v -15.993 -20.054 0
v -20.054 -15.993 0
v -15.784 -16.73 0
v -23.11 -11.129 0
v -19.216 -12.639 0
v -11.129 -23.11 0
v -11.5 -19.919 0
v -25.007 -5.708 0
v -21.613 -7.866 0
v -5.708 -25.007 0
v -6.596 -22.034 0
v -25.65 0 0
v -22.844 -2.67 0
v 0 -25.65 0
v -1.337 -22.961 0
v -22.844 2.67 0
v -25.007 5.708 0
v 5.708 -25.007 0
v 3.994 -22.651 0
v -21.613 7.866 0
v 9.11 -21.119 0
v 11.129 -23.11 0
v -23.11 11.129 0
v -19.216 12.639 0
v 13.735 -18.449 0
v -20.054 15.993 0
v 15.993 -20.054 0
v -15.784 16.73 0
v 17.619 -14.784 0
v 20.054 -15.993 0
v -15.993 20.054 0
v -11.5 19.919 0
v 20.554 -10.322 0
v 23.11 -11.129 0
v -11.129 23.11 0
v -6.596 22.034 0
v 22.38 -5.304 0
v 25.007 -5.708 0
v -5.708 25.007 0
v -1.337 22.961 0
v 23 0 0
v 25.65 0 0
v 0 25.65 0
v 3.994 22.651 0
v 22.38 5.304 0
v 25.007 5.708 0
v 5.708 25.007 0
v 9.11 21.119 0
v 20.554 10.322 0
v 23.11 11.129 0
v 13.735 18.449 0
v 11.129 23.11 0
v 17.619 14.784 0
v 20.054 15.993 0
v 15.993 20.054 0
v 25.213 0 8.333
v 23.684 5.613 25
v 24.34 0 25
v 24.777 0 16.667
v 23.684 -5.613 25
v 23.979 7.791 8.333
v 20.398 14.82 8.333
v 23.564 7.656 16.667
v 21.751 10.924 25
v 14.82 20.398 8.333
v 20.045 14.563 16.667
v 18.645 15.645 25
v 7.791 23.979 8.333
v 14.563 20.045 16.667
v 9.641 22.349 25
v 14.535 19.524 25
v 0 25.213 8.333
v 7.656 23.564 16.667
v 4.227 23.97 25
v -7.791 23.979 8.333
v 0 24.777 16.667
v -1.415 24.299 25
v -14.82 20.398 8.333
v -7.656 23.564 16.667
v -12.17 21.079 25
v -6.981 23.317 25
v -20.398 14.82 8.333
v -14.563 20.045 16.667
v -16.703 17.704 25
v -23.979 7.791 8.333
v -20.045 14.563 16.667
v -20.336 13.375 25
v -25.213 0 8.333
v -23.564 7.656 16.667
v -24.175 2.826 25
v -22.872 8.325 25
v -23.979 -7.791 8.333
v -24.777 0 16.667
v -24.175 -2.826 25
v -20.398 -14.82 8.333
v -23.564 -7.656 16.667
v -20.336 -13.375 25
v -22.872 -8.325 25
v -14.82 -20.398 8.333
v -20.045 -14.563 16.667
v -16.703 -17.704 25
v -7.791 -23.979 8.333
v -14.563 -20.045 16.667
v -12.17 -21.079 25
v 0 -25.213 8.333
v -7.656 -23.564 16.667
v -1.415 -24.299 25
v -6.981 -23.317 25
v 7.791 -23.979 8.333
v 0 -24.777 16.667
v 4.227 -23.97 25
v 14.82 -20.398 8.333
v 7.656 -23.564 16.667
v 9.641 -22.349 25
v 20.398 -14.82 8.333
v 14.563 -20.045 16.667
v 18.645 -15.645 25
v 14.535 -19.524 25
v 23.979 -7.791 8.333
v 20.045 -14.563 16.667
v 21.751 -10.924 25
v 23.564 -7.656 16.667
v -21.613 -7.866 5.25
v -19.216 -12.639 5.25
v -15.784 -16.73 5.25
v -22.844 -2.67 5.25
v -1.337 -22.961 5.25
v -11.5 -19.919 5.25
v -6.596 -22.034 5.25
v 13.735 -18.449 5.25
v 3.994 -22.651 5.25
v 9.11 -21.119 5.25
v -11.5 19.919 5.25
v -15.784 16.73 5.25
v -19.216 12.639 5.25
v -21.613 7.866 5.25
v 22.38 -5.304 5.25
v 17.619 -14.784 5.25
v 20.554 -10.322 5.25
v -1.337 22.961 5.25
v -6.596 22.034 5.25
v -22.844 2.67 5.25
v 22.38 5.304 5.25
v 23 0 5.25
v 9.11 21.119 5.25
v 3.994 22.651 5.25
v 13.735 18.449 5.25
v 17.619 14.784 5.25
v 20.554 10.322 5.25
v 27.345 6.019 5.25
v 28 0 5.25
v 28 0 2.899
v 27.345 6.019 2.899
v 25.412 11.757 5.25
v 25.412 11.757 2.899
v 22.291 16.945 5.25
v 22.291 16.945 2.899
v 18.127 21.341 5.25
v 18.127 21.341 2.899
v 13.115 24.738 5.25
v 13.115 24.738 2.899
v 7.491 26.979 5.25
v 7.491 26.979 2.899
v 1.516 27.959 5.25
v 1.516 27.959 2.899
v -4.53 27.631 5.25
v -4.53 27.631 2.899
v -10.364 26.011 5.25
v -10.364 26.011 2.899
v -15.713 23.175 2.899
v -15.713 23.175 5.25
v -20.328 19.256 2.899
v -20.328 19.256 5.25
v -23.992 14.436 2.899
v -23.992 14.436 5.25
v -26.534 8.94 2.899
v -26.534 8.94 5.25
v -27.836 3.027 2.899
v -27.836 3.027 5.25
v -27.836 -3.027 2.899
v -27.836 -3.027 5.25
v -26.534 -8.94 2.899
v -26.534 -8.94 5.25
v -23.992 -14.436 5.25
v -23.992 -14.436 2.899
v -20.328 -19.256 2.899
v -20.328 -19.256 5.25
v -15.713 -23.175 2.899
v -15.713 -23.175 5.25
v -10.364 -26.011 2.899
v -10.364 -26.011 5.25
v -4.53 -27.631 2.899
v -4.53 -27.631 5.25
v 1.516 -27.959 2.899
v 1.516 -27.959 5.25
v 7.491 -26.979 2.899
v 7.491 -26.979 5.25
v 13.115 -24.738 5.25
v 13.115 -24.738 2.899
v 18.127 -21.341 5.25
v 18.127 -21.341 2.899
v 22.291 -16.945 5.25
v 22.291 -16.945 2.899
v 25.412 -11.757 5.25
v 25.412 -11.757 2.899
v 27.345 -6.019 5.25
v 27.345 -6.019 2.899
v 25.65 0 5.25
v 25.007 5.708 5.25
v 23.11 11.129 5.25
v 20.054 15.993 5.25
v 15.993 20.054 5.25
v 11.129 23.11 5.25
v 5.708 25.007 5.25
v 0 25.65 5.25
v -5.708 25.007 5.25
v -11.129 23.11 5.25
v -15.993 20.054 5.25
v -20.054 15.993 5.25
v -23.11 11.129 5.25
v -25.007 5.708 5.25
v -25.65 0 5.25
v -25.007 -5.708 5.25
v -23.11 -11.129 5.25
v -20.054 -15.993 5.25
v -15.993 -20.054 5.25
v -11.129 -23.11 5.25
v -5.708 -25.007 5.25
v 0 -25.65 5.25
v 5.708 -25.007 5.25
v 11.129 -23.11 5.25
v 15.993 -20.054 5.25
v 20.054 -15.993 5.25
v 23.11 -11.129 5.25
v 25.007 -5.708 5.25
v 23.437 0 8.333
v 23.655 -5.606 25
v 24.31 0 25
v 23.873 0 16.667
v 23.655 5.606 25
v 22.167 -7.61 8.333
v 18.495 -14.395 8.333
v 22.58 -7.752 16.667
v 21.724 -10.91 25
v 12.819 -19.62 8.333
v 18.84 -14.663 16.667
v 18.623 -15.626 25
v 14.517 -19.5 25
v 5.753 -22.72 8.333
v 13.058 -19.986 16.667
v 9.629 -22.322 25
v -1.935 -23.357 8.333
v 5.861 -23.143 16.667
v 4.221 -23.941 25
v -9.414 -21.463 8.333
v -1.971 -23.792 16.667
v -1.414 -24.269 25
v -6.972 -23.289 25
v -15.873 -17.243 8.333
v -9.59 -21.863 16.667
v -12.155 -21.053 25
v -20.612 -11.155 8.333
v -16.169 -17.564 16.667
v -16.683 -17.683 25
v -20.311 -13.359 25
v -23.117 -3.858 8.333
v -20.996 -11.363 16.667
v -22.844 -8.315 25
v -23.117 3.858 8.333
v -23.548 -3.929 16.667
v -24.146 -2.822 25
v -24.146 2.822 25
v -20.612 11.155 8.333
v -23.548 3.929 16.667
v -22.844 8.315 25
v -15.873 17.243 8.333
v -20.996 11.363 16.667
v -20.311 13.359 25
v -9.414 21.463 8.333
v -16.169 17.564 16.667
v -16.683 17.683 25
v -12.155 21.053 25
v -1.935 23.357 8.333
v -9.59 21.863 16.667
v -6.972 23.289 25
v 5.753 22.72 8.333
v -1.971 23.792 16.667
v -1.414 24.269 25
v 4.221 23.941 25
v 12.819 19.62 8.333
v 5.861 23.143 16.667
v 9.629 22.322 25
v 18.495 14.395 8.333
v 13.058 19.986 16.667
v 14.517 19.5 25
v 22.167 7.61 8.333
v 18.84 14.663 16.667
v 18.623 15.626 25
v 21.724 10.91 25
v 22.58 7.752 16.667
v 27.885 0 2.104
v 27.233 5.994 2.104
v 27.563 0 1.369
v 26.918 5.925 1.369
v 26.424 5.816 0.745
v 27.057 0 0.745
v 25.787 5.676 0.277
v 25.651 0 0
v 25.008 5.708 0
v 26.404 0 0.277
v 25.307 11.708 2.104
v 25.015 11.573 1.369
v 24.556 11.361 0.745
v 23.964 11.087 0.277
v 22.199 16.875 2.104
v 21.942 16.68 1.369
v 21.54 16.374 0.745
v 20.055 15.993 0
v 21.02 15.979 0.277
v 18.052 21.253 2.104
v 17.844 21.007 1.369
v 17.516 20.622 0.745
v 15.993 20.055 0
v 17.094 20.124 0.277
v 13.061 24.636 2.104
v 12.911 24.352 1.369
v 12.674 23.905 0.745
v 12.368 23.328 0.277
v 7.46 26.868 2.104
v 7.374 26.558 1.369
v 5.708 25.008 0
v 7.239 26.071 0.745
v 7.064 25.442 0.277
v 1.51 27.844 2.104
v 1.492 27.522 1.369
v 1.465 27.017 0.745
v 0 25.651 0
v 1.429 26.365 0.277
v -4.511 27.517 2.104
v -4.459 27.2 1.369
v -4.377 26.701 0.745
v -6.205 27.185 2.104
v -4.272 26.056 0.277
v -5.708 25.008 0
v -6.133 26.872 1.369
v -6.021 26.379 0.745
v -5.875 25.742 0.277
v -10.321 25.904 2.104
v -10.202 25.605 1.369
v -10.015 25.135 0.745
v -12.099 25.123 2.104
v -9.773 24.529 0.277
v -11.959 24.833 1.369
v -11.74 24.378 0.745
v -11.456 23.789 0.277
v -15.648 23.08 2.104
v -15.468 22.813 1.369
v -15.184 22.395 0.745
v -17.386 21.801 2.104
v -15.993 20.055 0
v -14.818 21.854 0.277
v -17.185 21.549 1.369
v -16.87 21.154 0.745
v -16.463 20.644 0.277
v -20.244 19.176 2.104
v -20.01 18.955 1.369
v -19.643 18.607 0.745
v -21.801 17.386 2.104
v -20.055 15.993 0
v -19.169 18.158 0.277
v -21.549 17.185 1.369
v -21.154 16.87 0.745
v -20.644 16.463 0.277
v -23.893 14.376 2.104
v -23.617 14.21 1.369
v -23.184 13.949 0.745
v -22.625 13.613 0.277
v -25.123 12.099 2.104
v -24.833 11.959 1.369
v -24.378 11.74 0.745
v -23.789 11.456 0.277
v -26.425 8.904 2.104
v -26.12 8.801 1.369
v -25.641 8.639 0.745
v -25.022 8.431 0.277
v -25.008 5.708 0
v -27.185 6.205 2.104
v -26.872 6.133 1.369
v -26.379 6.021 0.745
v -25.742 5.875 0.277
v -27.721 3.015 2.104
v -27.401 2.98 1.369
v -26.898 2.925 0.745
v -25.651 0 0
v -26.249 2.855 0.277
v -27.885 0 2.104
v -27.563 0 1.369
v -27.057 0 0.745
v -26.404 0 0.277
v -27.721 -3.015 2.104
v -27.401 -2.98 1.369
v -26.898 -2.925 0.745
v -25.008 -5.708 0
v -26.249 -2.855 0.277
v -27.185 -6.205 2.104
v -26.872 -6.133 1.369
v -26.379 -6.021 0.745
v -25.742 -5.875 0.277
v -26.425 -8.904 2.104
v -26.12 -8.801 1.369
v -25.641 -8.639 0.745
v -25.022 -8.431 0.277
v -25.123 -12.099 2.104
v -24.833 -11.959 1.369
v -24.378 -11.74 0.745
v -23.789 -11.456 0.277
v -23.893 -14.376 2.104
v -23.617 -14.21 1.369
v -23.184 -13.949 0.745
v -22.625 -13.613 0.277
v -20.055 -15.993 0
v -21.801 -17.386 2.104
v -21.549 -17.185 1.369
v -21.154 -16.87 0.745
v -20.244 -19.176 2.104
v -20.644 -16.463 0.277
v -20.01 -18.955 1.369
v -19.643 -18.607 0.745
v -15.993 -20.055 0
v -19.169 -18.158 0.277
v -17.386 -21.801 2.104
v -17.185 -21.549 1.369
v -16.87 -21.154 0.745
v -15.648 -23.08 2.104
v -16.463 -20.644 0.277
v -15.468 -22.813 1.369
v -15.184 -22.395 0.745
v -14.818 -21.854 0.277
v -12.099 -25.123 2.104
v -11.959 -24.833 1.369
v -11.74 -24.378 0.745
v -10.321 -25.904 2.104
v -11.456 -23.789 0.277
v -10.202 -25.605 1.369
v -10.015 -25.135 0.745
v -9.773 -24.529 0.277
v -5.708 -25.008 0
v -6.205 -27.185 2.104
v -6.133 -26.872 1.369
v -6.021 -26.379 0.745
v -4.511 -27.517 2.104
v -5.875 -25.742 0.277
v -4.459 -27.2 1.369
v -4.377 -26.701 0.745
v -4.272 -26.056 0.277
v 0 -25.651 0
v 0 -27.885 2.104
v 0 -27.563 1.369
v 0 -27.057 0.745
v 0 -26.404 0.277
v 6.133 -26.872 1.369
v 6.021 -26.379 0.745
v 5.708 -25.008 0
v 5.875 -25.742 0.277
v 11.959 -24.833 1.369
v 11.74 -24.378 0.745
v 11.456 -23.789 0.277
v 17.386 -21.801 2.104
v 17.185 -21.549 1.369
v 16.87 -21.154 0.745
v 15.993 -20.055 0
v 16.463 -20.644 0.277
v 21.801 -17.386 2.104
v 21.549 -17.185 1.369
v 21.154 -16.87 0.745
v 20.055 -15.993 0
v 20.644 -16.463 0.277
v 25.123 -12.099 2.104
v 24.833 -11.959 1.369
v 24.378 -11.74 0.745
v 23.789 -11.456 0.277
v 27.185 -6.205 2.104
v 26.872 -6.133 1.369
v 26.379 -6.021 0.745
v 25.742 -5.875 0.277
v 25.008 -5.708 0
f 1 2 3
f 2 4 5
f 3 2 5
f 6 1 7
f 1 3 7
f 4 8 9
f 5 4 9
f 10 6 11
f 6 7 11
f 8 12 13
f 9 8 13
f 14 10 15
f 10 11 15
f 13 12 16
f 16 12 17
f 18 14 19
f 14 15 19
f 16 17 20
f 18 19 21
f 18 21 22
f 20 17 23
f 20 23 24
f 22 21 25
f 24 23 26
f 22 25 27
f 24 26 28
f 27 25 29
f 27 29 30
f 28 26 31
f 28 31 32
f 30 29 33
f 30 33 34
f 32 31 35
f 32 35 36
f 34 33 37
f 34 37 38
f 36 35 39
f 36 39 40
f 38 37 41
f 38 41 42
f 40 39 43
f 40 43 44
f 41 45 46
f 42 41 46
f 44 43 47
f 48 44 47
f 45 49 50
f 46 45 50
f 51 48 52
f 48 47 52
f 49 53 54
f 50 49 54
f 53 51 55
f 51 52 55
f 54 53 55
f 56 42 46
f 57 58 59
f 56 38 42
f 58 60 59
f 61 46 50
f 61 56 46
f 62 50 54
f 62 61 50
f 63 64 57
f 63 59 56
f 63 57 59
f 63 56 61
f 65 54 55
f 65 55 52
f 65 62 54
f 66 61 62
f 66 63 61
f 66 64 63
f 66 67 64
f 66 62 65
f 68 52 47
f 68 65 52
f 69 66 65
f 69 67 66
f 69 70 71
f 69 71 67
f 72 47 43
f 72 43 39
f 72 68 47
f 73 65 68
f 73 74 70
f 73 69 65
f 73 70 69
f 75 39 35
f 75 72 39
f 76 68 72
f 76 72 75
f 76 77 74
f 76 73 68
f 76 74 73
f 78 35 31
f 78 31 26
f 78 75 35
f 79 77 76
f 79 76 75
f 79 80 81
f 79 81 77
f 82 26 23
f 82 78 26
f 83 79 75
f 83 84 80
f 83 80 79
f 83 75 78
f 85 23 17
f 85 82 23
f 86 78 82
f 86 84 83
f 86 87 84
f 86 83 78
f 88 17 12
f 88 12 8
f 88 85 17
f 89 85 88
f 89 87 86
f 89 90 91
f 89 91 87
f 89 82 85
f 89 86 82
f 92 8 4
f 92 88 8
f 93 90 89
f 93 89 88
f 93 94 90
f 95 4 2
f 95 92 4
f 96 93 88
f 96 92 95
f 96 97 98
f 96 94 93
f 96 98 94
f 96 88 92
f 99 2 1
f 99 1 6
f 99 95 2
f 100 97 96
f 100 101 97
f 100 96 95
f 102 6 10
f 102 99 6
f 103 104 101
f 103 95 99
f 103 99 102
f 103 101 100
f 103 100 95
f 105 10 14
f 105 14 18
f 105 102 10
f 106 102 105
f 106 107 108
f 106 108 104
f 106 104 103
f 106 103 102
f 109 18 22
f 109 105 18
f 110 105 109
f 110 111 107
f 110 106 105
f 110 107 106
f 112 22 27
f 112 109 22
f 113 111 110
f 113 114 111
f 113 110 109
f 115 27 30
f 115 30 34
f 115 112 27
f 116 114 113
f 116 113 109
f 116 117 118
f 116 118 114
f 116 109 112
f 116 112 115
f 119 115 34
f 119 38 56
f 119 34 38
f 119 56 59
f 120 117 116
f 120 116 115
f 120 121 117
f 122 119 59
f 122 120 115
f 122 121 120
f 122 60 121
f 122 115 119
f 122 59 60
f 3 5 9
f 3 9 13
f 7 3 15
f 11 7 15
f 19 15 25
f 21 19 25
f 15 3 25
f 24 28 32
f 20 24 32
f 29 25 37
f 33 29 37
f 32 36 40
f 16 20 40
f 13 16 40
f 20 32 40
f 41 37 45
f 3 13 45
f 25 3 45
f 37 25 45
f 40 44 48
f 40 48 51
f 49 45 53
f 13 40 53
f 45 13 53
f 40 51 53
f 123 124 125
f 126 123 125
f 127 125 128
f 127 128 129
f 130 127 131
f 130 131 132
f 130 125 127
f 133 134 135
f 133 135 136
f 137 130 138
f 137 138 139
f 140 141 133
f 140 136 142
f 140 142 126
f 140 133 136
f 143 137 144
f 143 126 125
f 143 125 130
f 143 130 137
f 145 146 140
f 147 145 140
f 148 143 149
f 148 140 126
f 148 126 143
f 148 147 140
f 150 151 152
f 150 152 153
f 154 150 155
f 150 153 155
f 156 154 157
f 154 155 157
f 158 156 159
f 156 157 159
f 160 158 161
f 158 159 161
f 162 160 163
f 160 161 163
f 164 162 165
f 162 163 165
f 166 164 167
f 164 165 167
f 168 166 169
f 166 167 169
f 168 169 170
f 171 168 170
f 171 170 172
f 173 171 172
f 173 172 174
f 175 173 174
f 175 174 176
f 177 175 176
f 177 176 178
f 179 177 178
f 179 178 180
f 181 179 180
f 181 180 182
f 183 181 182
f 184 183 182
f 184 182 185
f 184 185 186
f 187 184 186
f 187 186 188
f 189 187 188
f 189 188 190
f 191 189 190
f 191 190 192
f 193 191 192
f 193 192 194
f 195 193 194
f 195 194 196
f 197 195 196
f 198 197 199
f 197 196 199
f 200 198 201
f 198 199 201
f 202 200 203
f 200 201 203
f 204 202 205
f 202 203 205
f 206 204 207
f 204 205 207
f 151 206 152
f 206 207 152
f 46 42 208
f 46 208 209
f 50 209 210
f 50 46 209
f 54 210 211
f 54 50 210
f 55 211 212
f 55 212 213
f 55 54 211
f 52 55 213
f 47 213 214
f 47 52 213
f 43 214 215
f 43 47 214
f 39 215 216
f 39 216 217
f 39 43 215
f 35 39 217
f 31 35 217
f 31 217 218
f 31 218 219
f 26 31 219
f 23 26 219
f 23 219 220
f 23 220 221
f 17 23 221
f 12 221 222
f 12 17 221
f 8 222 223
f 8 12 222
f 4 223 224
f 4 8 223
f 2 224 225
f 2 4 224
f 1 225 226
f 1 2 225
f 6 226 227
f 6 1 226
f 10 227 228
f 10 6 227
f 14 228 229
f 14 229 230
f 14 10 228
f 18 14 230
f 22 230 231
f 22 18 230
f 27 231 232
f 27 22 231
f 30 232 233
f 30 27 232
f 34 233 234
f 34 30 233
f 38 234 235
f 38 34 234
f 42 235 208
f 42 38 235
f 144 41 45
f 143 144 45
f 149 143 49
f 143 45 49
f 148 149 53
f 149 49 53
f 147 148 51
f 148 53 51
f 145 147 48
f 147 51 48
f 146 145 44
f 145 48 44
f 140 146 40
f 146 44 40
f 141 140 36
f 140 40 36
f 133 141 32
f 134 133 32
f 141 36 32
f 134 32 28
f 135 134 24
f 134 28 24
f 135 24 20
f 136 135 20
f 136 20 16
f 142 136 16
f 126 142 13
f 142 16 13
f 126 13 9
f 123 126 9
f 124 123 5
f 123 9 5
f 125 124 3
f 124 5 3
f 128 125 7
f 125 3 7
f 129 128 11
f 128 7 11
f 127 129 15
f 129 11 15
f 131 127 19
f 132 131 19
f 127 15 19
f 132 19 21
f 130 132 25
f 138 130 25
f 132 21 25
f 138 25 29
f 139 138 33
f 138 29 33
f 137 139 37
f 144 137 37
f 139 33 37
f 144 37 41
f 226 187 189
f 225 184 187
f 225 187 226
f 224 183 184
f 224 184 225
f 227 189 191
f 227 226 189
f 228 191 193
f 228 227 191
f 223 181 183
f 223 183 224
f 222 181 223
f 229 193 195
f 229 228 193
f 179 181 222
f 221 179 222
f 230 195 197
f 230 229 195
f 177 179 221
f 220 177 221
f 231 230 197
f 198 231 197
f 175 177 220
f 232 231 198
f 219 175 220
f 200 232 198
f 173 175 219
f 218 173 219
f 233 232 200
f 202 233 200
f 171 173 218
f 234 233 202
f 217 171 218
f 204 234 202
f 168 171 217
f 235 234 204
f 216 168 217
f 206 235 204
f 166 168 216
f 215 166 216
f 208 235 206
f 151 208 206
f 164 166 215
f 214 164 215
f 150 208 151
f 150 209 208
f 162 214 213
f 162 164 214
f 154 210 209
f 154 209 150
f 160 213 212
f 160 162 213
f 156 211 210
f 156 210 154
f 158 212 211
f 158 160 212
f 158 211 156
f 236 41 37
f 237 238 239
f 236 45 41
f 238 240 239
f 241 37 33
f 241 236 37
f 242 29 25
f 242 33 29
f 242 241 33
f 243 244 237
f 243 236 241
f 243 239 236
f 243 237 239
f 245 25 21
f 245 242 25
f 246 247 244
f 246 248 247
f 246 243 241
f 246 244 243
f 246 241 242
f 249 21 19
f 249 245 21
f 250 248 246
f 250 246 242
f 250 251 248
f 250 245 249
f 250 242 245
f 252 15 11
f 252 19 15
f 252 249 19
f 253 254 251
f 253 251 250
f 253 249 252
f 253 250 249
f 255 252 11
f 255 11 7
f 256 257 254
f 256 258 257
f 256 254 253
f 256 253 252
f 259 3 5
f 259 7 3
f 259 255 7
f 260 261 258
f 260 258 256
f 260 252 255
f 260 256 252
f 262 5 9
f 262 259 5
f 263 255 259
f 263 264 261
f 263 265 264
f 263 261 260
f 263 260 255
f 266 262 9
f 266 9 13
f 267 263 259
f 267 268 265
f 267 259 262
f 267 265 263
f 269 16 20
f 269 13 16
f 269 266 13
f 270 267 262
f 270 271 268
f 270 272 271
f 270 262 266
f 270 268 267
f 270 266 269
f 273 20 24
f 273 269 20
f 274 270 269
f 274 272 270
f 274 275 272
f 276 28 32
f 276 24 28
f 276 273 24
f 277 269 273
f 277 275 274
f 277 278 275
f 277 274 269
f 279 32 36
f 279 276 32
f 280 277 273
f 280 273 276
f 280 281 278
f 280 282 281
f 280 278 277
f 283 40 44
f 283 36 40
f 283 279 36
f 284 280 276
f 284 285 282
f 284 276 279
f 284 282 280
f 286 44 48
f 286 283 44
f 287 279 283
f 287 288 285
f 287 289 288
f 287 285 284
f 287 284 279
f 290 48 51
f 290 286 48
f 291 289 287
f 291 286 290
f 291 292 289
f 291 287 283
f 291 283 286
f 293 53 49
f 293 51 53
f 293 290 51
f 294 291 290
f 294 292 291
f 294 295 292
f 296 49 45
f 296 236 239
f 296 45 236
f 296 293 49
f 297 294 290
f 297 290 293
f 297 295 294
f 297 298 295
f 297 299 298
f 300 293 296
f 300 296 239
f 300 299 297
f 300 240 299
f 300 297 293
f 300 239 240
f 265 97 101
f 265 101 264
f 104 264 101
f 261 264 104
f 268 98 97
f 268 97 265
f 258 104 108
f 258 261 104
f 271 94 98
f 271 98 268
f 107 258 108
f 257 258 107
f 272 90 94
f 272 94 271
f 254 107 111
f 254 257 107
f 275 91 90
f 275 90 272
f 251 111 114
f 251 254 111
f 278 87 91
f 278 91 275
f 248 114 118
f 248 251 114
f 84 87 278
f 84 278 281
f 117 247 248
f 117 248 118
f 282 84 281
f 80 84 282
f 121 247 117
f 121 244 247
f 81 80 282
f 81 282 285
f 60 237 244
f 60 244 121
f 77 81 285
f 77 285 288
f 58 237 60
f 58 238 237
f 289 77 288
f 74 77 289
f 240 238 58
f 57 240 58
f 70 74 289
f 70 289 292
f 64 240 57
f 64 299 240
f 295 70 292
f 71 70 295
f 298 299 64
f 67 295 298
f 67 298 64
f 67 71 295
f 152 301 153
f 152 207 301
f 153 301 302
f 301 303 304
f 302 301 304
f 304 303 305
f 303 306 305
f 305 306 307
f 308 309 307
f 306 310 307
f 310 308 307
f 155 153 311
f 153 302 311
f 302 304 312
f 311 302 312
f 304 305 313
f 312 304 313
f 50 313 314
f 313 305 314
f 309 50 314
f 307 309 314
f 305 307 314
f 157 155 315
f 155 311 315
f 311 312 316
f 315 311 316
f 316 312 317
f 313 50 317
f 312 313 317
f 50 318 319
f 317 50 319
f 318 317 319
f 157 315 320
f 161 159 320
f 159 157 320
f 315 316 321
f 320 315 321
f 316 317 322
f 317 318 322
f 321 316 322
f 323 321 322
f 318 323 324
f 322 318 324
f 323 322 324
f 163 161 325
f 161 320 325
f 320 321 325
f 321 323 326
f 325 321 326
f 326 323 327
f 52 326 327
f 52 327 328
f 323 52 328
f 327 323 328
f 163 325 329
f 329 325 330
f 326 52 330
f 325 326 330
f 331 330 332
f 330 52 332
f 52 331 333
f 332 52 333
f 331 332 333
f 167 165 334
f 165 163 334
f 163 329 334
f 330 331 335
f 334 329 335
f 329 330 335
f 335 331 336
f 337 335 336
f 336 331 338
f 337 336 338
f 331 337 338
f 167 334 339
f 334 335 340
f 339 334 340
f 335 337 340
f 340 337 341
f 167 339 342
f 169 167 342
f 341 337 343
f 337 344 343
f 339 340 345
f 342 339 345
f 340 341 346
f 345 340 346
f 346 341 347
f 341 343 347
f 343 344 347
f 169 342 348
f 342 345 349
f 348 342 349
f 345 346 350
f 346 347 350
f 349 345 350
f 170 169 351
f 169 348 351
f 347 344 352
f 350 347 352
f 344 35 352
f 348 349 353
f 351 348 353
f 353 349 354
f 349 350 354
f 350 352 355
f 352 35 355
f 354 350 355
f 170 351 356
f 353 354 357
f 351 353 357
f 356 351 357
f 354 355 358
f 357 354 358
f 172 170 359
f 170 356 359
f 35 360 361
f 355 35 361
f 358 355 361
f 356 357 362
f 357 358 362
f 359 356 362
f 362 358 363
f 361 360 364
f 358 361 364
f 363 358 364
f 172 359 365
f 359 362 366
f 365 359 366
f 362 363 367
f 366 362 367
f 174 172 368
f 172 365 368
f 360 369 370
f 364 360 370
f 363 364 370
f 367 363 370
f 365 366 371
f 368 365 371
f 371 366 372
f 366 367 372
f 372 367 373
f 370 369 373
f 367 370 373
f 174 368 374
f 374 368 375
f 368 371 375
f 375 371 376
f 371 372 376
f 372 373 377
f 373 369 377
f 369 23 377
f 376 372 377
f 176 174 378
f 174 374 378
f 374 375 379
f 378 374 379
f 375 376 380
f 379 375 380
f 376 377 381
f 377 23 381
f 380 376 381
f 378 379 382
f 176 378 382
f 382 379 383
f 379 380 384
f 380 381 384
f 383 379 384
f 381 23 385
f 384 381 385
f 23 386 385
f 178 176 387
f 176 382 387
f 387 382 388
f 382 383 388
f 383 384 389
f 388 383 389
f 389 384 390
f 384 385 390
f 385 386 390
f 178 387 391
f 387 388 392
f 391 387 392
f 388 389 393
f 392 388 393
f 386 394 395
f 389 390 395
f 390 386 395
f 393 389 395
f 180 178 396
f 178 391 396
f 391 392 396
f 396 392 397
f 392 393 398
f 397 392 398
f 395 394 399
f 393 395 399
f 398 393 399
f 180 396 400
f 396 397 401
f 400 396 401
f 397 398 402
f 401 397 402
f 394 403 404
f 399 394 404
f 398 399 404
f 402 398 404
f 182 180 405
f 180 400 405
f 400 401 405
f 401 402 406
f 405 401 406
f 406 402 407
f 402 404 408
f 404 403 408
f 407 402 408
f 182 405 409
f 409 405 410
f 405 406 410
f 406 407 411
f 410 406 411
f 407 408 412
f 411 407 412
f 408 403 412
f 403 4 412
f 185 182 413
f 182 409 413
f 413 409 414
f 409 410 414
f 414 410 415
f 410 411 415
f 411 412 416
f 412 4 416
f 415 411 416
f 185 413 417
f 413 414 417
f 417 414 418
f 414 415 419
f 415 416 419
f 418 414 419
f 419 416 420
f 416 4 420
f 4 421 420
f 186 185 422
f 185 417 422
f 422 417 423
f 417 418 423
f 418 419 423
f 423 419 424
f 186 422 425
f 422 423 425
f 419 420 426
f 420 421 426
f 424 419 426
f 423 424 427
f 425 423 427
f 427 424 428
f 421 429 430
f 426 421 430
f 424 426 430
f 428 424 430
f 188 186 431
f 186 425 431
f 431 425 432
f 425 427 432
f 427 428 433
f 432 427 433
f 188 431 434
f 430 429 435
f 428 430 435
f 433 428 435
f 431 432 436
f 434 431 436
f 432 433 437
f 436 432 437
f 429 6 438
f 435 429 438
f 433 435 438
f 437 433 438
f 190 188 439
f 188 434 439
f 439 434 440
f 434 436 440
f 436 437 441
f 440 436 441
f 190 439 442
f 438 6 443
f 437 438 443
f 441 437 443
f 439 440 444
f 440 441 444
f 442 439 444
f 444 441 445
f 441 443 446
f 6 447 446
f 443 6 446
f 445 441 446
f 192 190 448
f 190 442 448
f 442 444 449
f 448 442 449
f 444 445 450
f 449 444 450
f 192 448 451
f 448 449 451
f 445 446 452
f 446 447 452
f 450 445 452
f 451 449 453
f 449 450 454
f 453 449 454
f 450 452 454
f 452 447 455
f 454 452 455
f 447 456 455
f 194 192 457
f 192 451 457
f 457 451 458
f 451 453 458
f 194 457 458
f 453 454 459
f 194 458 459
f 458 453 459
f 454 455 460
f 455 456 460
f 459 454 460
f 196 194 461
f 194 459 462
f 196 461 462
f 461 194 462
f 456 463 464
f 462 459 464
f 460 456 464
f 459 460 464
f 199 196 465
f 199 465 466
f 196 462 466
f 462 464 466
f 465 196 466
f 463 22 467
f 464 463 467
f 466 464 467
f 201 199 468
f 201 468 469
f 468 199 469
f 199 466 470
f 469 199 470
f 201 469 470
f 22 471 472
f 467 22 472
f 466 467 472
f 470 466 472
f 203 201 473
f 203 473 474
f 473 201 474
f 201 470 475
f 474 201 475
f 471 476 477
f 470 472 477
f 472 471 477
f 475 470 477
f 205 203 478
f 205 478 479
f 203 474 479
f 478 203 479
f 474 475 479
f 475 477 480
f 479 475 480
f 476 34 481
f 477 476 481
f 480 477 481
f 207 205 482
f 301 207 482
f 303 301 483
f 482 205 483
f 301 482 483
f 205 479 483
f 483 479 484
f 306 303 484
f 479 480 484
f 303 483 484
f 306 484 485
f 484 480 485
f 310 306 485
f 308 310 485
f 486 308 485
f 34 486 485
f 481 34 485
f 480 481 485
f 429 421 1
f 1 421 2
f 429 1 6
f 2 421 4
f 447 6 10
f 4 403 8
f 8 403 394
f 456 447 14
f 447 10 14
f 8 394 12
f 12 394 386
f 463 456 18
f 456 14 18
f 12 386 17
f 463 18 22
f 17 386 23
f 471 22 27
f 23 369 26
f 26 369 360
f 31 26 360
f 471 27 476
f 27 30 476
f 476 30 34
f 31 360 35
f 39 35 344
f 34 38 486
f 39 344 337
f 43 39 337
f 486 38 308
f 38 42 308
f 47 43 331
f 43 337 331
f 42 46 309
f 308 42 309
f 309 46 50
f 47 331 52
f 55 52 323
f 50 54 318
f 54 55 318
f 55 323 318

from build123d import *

# Parameters (mm, degrees)
F0_R     = 25.65
F0_R_2   = 23
F1_DEPTH = 25
F1_TAPER = 3
F2_DEPTH = 5.25
F0_R_3   = 28.0000000894
F3_DEPTH = 5.25


# Not quite as in the source:
# - a fillet or chamfer that OpenCascade refuses, or shapes differently, is made with other operations: its cross-section is extruded or revolved along the edge and cut away or added


with BuildPart() as f1:
    # F0 (on Top) → F1 (new body)
    with BuildSketch(Plane.XY):
        Circle(F0_R)
        Circle(F0_R_2, mode=Mode.SUBTRACT)
    extrude(amount=F1_DEPTH, taper=F1_TAPER)


with BuildPart() as f2:
    # F0 (on Top) → F2 (new body)
    with BuildSketch(Plane.XY):
        Circle(F0_R_2)
    extrude(amount=F2_DEPTH)


with BuildPart() as f3:
    # F0 (on Top) → F3 (new body)
    with BuildSketch(Plane.XY):
        Circle(F0_R_3)
        Circle(F0_R, mode=Mode.SUBTRACT)
    extrude(amount=F3_DEPTH)

    # F4: fillet of radius 3 on 1 edges, made by hand

    # F4_s1 → F4_t2 (revolve, cut)
    with BuildSketch(Plane.XZ):
        with BuildLine():
            ThreePointArc((28.0001500894, 2.9286165874), (27.3399841876, 1.0510712769), (25.6500324941, -0.0001464382))
            Line((25.6500324941, -0.0001464382), (25.6630301422, -0.0587216987))
            ThreePointArc((25.6630301422, -0.0587216987), (26.8250162918, -0.06), (28.0000000894, -0.06))
            Line((28.0000000894, -0.06), (28.0600000894, 0))
            ThreePointArc((28.0600000894, 0), (28.0600000894, 1.4643082937), (28.0601500894, 2.9286165874))
            Line((28.0601500894, 2.9286165874), (28.0001500894, 2.9286165874))
        make_face()
    revolve(axis=Axis((0, 0, 0), (0, 0, 1)), mode=Mode.SUBTRACT)


solid = Compound([f1.part, f2.part, f3.part])
